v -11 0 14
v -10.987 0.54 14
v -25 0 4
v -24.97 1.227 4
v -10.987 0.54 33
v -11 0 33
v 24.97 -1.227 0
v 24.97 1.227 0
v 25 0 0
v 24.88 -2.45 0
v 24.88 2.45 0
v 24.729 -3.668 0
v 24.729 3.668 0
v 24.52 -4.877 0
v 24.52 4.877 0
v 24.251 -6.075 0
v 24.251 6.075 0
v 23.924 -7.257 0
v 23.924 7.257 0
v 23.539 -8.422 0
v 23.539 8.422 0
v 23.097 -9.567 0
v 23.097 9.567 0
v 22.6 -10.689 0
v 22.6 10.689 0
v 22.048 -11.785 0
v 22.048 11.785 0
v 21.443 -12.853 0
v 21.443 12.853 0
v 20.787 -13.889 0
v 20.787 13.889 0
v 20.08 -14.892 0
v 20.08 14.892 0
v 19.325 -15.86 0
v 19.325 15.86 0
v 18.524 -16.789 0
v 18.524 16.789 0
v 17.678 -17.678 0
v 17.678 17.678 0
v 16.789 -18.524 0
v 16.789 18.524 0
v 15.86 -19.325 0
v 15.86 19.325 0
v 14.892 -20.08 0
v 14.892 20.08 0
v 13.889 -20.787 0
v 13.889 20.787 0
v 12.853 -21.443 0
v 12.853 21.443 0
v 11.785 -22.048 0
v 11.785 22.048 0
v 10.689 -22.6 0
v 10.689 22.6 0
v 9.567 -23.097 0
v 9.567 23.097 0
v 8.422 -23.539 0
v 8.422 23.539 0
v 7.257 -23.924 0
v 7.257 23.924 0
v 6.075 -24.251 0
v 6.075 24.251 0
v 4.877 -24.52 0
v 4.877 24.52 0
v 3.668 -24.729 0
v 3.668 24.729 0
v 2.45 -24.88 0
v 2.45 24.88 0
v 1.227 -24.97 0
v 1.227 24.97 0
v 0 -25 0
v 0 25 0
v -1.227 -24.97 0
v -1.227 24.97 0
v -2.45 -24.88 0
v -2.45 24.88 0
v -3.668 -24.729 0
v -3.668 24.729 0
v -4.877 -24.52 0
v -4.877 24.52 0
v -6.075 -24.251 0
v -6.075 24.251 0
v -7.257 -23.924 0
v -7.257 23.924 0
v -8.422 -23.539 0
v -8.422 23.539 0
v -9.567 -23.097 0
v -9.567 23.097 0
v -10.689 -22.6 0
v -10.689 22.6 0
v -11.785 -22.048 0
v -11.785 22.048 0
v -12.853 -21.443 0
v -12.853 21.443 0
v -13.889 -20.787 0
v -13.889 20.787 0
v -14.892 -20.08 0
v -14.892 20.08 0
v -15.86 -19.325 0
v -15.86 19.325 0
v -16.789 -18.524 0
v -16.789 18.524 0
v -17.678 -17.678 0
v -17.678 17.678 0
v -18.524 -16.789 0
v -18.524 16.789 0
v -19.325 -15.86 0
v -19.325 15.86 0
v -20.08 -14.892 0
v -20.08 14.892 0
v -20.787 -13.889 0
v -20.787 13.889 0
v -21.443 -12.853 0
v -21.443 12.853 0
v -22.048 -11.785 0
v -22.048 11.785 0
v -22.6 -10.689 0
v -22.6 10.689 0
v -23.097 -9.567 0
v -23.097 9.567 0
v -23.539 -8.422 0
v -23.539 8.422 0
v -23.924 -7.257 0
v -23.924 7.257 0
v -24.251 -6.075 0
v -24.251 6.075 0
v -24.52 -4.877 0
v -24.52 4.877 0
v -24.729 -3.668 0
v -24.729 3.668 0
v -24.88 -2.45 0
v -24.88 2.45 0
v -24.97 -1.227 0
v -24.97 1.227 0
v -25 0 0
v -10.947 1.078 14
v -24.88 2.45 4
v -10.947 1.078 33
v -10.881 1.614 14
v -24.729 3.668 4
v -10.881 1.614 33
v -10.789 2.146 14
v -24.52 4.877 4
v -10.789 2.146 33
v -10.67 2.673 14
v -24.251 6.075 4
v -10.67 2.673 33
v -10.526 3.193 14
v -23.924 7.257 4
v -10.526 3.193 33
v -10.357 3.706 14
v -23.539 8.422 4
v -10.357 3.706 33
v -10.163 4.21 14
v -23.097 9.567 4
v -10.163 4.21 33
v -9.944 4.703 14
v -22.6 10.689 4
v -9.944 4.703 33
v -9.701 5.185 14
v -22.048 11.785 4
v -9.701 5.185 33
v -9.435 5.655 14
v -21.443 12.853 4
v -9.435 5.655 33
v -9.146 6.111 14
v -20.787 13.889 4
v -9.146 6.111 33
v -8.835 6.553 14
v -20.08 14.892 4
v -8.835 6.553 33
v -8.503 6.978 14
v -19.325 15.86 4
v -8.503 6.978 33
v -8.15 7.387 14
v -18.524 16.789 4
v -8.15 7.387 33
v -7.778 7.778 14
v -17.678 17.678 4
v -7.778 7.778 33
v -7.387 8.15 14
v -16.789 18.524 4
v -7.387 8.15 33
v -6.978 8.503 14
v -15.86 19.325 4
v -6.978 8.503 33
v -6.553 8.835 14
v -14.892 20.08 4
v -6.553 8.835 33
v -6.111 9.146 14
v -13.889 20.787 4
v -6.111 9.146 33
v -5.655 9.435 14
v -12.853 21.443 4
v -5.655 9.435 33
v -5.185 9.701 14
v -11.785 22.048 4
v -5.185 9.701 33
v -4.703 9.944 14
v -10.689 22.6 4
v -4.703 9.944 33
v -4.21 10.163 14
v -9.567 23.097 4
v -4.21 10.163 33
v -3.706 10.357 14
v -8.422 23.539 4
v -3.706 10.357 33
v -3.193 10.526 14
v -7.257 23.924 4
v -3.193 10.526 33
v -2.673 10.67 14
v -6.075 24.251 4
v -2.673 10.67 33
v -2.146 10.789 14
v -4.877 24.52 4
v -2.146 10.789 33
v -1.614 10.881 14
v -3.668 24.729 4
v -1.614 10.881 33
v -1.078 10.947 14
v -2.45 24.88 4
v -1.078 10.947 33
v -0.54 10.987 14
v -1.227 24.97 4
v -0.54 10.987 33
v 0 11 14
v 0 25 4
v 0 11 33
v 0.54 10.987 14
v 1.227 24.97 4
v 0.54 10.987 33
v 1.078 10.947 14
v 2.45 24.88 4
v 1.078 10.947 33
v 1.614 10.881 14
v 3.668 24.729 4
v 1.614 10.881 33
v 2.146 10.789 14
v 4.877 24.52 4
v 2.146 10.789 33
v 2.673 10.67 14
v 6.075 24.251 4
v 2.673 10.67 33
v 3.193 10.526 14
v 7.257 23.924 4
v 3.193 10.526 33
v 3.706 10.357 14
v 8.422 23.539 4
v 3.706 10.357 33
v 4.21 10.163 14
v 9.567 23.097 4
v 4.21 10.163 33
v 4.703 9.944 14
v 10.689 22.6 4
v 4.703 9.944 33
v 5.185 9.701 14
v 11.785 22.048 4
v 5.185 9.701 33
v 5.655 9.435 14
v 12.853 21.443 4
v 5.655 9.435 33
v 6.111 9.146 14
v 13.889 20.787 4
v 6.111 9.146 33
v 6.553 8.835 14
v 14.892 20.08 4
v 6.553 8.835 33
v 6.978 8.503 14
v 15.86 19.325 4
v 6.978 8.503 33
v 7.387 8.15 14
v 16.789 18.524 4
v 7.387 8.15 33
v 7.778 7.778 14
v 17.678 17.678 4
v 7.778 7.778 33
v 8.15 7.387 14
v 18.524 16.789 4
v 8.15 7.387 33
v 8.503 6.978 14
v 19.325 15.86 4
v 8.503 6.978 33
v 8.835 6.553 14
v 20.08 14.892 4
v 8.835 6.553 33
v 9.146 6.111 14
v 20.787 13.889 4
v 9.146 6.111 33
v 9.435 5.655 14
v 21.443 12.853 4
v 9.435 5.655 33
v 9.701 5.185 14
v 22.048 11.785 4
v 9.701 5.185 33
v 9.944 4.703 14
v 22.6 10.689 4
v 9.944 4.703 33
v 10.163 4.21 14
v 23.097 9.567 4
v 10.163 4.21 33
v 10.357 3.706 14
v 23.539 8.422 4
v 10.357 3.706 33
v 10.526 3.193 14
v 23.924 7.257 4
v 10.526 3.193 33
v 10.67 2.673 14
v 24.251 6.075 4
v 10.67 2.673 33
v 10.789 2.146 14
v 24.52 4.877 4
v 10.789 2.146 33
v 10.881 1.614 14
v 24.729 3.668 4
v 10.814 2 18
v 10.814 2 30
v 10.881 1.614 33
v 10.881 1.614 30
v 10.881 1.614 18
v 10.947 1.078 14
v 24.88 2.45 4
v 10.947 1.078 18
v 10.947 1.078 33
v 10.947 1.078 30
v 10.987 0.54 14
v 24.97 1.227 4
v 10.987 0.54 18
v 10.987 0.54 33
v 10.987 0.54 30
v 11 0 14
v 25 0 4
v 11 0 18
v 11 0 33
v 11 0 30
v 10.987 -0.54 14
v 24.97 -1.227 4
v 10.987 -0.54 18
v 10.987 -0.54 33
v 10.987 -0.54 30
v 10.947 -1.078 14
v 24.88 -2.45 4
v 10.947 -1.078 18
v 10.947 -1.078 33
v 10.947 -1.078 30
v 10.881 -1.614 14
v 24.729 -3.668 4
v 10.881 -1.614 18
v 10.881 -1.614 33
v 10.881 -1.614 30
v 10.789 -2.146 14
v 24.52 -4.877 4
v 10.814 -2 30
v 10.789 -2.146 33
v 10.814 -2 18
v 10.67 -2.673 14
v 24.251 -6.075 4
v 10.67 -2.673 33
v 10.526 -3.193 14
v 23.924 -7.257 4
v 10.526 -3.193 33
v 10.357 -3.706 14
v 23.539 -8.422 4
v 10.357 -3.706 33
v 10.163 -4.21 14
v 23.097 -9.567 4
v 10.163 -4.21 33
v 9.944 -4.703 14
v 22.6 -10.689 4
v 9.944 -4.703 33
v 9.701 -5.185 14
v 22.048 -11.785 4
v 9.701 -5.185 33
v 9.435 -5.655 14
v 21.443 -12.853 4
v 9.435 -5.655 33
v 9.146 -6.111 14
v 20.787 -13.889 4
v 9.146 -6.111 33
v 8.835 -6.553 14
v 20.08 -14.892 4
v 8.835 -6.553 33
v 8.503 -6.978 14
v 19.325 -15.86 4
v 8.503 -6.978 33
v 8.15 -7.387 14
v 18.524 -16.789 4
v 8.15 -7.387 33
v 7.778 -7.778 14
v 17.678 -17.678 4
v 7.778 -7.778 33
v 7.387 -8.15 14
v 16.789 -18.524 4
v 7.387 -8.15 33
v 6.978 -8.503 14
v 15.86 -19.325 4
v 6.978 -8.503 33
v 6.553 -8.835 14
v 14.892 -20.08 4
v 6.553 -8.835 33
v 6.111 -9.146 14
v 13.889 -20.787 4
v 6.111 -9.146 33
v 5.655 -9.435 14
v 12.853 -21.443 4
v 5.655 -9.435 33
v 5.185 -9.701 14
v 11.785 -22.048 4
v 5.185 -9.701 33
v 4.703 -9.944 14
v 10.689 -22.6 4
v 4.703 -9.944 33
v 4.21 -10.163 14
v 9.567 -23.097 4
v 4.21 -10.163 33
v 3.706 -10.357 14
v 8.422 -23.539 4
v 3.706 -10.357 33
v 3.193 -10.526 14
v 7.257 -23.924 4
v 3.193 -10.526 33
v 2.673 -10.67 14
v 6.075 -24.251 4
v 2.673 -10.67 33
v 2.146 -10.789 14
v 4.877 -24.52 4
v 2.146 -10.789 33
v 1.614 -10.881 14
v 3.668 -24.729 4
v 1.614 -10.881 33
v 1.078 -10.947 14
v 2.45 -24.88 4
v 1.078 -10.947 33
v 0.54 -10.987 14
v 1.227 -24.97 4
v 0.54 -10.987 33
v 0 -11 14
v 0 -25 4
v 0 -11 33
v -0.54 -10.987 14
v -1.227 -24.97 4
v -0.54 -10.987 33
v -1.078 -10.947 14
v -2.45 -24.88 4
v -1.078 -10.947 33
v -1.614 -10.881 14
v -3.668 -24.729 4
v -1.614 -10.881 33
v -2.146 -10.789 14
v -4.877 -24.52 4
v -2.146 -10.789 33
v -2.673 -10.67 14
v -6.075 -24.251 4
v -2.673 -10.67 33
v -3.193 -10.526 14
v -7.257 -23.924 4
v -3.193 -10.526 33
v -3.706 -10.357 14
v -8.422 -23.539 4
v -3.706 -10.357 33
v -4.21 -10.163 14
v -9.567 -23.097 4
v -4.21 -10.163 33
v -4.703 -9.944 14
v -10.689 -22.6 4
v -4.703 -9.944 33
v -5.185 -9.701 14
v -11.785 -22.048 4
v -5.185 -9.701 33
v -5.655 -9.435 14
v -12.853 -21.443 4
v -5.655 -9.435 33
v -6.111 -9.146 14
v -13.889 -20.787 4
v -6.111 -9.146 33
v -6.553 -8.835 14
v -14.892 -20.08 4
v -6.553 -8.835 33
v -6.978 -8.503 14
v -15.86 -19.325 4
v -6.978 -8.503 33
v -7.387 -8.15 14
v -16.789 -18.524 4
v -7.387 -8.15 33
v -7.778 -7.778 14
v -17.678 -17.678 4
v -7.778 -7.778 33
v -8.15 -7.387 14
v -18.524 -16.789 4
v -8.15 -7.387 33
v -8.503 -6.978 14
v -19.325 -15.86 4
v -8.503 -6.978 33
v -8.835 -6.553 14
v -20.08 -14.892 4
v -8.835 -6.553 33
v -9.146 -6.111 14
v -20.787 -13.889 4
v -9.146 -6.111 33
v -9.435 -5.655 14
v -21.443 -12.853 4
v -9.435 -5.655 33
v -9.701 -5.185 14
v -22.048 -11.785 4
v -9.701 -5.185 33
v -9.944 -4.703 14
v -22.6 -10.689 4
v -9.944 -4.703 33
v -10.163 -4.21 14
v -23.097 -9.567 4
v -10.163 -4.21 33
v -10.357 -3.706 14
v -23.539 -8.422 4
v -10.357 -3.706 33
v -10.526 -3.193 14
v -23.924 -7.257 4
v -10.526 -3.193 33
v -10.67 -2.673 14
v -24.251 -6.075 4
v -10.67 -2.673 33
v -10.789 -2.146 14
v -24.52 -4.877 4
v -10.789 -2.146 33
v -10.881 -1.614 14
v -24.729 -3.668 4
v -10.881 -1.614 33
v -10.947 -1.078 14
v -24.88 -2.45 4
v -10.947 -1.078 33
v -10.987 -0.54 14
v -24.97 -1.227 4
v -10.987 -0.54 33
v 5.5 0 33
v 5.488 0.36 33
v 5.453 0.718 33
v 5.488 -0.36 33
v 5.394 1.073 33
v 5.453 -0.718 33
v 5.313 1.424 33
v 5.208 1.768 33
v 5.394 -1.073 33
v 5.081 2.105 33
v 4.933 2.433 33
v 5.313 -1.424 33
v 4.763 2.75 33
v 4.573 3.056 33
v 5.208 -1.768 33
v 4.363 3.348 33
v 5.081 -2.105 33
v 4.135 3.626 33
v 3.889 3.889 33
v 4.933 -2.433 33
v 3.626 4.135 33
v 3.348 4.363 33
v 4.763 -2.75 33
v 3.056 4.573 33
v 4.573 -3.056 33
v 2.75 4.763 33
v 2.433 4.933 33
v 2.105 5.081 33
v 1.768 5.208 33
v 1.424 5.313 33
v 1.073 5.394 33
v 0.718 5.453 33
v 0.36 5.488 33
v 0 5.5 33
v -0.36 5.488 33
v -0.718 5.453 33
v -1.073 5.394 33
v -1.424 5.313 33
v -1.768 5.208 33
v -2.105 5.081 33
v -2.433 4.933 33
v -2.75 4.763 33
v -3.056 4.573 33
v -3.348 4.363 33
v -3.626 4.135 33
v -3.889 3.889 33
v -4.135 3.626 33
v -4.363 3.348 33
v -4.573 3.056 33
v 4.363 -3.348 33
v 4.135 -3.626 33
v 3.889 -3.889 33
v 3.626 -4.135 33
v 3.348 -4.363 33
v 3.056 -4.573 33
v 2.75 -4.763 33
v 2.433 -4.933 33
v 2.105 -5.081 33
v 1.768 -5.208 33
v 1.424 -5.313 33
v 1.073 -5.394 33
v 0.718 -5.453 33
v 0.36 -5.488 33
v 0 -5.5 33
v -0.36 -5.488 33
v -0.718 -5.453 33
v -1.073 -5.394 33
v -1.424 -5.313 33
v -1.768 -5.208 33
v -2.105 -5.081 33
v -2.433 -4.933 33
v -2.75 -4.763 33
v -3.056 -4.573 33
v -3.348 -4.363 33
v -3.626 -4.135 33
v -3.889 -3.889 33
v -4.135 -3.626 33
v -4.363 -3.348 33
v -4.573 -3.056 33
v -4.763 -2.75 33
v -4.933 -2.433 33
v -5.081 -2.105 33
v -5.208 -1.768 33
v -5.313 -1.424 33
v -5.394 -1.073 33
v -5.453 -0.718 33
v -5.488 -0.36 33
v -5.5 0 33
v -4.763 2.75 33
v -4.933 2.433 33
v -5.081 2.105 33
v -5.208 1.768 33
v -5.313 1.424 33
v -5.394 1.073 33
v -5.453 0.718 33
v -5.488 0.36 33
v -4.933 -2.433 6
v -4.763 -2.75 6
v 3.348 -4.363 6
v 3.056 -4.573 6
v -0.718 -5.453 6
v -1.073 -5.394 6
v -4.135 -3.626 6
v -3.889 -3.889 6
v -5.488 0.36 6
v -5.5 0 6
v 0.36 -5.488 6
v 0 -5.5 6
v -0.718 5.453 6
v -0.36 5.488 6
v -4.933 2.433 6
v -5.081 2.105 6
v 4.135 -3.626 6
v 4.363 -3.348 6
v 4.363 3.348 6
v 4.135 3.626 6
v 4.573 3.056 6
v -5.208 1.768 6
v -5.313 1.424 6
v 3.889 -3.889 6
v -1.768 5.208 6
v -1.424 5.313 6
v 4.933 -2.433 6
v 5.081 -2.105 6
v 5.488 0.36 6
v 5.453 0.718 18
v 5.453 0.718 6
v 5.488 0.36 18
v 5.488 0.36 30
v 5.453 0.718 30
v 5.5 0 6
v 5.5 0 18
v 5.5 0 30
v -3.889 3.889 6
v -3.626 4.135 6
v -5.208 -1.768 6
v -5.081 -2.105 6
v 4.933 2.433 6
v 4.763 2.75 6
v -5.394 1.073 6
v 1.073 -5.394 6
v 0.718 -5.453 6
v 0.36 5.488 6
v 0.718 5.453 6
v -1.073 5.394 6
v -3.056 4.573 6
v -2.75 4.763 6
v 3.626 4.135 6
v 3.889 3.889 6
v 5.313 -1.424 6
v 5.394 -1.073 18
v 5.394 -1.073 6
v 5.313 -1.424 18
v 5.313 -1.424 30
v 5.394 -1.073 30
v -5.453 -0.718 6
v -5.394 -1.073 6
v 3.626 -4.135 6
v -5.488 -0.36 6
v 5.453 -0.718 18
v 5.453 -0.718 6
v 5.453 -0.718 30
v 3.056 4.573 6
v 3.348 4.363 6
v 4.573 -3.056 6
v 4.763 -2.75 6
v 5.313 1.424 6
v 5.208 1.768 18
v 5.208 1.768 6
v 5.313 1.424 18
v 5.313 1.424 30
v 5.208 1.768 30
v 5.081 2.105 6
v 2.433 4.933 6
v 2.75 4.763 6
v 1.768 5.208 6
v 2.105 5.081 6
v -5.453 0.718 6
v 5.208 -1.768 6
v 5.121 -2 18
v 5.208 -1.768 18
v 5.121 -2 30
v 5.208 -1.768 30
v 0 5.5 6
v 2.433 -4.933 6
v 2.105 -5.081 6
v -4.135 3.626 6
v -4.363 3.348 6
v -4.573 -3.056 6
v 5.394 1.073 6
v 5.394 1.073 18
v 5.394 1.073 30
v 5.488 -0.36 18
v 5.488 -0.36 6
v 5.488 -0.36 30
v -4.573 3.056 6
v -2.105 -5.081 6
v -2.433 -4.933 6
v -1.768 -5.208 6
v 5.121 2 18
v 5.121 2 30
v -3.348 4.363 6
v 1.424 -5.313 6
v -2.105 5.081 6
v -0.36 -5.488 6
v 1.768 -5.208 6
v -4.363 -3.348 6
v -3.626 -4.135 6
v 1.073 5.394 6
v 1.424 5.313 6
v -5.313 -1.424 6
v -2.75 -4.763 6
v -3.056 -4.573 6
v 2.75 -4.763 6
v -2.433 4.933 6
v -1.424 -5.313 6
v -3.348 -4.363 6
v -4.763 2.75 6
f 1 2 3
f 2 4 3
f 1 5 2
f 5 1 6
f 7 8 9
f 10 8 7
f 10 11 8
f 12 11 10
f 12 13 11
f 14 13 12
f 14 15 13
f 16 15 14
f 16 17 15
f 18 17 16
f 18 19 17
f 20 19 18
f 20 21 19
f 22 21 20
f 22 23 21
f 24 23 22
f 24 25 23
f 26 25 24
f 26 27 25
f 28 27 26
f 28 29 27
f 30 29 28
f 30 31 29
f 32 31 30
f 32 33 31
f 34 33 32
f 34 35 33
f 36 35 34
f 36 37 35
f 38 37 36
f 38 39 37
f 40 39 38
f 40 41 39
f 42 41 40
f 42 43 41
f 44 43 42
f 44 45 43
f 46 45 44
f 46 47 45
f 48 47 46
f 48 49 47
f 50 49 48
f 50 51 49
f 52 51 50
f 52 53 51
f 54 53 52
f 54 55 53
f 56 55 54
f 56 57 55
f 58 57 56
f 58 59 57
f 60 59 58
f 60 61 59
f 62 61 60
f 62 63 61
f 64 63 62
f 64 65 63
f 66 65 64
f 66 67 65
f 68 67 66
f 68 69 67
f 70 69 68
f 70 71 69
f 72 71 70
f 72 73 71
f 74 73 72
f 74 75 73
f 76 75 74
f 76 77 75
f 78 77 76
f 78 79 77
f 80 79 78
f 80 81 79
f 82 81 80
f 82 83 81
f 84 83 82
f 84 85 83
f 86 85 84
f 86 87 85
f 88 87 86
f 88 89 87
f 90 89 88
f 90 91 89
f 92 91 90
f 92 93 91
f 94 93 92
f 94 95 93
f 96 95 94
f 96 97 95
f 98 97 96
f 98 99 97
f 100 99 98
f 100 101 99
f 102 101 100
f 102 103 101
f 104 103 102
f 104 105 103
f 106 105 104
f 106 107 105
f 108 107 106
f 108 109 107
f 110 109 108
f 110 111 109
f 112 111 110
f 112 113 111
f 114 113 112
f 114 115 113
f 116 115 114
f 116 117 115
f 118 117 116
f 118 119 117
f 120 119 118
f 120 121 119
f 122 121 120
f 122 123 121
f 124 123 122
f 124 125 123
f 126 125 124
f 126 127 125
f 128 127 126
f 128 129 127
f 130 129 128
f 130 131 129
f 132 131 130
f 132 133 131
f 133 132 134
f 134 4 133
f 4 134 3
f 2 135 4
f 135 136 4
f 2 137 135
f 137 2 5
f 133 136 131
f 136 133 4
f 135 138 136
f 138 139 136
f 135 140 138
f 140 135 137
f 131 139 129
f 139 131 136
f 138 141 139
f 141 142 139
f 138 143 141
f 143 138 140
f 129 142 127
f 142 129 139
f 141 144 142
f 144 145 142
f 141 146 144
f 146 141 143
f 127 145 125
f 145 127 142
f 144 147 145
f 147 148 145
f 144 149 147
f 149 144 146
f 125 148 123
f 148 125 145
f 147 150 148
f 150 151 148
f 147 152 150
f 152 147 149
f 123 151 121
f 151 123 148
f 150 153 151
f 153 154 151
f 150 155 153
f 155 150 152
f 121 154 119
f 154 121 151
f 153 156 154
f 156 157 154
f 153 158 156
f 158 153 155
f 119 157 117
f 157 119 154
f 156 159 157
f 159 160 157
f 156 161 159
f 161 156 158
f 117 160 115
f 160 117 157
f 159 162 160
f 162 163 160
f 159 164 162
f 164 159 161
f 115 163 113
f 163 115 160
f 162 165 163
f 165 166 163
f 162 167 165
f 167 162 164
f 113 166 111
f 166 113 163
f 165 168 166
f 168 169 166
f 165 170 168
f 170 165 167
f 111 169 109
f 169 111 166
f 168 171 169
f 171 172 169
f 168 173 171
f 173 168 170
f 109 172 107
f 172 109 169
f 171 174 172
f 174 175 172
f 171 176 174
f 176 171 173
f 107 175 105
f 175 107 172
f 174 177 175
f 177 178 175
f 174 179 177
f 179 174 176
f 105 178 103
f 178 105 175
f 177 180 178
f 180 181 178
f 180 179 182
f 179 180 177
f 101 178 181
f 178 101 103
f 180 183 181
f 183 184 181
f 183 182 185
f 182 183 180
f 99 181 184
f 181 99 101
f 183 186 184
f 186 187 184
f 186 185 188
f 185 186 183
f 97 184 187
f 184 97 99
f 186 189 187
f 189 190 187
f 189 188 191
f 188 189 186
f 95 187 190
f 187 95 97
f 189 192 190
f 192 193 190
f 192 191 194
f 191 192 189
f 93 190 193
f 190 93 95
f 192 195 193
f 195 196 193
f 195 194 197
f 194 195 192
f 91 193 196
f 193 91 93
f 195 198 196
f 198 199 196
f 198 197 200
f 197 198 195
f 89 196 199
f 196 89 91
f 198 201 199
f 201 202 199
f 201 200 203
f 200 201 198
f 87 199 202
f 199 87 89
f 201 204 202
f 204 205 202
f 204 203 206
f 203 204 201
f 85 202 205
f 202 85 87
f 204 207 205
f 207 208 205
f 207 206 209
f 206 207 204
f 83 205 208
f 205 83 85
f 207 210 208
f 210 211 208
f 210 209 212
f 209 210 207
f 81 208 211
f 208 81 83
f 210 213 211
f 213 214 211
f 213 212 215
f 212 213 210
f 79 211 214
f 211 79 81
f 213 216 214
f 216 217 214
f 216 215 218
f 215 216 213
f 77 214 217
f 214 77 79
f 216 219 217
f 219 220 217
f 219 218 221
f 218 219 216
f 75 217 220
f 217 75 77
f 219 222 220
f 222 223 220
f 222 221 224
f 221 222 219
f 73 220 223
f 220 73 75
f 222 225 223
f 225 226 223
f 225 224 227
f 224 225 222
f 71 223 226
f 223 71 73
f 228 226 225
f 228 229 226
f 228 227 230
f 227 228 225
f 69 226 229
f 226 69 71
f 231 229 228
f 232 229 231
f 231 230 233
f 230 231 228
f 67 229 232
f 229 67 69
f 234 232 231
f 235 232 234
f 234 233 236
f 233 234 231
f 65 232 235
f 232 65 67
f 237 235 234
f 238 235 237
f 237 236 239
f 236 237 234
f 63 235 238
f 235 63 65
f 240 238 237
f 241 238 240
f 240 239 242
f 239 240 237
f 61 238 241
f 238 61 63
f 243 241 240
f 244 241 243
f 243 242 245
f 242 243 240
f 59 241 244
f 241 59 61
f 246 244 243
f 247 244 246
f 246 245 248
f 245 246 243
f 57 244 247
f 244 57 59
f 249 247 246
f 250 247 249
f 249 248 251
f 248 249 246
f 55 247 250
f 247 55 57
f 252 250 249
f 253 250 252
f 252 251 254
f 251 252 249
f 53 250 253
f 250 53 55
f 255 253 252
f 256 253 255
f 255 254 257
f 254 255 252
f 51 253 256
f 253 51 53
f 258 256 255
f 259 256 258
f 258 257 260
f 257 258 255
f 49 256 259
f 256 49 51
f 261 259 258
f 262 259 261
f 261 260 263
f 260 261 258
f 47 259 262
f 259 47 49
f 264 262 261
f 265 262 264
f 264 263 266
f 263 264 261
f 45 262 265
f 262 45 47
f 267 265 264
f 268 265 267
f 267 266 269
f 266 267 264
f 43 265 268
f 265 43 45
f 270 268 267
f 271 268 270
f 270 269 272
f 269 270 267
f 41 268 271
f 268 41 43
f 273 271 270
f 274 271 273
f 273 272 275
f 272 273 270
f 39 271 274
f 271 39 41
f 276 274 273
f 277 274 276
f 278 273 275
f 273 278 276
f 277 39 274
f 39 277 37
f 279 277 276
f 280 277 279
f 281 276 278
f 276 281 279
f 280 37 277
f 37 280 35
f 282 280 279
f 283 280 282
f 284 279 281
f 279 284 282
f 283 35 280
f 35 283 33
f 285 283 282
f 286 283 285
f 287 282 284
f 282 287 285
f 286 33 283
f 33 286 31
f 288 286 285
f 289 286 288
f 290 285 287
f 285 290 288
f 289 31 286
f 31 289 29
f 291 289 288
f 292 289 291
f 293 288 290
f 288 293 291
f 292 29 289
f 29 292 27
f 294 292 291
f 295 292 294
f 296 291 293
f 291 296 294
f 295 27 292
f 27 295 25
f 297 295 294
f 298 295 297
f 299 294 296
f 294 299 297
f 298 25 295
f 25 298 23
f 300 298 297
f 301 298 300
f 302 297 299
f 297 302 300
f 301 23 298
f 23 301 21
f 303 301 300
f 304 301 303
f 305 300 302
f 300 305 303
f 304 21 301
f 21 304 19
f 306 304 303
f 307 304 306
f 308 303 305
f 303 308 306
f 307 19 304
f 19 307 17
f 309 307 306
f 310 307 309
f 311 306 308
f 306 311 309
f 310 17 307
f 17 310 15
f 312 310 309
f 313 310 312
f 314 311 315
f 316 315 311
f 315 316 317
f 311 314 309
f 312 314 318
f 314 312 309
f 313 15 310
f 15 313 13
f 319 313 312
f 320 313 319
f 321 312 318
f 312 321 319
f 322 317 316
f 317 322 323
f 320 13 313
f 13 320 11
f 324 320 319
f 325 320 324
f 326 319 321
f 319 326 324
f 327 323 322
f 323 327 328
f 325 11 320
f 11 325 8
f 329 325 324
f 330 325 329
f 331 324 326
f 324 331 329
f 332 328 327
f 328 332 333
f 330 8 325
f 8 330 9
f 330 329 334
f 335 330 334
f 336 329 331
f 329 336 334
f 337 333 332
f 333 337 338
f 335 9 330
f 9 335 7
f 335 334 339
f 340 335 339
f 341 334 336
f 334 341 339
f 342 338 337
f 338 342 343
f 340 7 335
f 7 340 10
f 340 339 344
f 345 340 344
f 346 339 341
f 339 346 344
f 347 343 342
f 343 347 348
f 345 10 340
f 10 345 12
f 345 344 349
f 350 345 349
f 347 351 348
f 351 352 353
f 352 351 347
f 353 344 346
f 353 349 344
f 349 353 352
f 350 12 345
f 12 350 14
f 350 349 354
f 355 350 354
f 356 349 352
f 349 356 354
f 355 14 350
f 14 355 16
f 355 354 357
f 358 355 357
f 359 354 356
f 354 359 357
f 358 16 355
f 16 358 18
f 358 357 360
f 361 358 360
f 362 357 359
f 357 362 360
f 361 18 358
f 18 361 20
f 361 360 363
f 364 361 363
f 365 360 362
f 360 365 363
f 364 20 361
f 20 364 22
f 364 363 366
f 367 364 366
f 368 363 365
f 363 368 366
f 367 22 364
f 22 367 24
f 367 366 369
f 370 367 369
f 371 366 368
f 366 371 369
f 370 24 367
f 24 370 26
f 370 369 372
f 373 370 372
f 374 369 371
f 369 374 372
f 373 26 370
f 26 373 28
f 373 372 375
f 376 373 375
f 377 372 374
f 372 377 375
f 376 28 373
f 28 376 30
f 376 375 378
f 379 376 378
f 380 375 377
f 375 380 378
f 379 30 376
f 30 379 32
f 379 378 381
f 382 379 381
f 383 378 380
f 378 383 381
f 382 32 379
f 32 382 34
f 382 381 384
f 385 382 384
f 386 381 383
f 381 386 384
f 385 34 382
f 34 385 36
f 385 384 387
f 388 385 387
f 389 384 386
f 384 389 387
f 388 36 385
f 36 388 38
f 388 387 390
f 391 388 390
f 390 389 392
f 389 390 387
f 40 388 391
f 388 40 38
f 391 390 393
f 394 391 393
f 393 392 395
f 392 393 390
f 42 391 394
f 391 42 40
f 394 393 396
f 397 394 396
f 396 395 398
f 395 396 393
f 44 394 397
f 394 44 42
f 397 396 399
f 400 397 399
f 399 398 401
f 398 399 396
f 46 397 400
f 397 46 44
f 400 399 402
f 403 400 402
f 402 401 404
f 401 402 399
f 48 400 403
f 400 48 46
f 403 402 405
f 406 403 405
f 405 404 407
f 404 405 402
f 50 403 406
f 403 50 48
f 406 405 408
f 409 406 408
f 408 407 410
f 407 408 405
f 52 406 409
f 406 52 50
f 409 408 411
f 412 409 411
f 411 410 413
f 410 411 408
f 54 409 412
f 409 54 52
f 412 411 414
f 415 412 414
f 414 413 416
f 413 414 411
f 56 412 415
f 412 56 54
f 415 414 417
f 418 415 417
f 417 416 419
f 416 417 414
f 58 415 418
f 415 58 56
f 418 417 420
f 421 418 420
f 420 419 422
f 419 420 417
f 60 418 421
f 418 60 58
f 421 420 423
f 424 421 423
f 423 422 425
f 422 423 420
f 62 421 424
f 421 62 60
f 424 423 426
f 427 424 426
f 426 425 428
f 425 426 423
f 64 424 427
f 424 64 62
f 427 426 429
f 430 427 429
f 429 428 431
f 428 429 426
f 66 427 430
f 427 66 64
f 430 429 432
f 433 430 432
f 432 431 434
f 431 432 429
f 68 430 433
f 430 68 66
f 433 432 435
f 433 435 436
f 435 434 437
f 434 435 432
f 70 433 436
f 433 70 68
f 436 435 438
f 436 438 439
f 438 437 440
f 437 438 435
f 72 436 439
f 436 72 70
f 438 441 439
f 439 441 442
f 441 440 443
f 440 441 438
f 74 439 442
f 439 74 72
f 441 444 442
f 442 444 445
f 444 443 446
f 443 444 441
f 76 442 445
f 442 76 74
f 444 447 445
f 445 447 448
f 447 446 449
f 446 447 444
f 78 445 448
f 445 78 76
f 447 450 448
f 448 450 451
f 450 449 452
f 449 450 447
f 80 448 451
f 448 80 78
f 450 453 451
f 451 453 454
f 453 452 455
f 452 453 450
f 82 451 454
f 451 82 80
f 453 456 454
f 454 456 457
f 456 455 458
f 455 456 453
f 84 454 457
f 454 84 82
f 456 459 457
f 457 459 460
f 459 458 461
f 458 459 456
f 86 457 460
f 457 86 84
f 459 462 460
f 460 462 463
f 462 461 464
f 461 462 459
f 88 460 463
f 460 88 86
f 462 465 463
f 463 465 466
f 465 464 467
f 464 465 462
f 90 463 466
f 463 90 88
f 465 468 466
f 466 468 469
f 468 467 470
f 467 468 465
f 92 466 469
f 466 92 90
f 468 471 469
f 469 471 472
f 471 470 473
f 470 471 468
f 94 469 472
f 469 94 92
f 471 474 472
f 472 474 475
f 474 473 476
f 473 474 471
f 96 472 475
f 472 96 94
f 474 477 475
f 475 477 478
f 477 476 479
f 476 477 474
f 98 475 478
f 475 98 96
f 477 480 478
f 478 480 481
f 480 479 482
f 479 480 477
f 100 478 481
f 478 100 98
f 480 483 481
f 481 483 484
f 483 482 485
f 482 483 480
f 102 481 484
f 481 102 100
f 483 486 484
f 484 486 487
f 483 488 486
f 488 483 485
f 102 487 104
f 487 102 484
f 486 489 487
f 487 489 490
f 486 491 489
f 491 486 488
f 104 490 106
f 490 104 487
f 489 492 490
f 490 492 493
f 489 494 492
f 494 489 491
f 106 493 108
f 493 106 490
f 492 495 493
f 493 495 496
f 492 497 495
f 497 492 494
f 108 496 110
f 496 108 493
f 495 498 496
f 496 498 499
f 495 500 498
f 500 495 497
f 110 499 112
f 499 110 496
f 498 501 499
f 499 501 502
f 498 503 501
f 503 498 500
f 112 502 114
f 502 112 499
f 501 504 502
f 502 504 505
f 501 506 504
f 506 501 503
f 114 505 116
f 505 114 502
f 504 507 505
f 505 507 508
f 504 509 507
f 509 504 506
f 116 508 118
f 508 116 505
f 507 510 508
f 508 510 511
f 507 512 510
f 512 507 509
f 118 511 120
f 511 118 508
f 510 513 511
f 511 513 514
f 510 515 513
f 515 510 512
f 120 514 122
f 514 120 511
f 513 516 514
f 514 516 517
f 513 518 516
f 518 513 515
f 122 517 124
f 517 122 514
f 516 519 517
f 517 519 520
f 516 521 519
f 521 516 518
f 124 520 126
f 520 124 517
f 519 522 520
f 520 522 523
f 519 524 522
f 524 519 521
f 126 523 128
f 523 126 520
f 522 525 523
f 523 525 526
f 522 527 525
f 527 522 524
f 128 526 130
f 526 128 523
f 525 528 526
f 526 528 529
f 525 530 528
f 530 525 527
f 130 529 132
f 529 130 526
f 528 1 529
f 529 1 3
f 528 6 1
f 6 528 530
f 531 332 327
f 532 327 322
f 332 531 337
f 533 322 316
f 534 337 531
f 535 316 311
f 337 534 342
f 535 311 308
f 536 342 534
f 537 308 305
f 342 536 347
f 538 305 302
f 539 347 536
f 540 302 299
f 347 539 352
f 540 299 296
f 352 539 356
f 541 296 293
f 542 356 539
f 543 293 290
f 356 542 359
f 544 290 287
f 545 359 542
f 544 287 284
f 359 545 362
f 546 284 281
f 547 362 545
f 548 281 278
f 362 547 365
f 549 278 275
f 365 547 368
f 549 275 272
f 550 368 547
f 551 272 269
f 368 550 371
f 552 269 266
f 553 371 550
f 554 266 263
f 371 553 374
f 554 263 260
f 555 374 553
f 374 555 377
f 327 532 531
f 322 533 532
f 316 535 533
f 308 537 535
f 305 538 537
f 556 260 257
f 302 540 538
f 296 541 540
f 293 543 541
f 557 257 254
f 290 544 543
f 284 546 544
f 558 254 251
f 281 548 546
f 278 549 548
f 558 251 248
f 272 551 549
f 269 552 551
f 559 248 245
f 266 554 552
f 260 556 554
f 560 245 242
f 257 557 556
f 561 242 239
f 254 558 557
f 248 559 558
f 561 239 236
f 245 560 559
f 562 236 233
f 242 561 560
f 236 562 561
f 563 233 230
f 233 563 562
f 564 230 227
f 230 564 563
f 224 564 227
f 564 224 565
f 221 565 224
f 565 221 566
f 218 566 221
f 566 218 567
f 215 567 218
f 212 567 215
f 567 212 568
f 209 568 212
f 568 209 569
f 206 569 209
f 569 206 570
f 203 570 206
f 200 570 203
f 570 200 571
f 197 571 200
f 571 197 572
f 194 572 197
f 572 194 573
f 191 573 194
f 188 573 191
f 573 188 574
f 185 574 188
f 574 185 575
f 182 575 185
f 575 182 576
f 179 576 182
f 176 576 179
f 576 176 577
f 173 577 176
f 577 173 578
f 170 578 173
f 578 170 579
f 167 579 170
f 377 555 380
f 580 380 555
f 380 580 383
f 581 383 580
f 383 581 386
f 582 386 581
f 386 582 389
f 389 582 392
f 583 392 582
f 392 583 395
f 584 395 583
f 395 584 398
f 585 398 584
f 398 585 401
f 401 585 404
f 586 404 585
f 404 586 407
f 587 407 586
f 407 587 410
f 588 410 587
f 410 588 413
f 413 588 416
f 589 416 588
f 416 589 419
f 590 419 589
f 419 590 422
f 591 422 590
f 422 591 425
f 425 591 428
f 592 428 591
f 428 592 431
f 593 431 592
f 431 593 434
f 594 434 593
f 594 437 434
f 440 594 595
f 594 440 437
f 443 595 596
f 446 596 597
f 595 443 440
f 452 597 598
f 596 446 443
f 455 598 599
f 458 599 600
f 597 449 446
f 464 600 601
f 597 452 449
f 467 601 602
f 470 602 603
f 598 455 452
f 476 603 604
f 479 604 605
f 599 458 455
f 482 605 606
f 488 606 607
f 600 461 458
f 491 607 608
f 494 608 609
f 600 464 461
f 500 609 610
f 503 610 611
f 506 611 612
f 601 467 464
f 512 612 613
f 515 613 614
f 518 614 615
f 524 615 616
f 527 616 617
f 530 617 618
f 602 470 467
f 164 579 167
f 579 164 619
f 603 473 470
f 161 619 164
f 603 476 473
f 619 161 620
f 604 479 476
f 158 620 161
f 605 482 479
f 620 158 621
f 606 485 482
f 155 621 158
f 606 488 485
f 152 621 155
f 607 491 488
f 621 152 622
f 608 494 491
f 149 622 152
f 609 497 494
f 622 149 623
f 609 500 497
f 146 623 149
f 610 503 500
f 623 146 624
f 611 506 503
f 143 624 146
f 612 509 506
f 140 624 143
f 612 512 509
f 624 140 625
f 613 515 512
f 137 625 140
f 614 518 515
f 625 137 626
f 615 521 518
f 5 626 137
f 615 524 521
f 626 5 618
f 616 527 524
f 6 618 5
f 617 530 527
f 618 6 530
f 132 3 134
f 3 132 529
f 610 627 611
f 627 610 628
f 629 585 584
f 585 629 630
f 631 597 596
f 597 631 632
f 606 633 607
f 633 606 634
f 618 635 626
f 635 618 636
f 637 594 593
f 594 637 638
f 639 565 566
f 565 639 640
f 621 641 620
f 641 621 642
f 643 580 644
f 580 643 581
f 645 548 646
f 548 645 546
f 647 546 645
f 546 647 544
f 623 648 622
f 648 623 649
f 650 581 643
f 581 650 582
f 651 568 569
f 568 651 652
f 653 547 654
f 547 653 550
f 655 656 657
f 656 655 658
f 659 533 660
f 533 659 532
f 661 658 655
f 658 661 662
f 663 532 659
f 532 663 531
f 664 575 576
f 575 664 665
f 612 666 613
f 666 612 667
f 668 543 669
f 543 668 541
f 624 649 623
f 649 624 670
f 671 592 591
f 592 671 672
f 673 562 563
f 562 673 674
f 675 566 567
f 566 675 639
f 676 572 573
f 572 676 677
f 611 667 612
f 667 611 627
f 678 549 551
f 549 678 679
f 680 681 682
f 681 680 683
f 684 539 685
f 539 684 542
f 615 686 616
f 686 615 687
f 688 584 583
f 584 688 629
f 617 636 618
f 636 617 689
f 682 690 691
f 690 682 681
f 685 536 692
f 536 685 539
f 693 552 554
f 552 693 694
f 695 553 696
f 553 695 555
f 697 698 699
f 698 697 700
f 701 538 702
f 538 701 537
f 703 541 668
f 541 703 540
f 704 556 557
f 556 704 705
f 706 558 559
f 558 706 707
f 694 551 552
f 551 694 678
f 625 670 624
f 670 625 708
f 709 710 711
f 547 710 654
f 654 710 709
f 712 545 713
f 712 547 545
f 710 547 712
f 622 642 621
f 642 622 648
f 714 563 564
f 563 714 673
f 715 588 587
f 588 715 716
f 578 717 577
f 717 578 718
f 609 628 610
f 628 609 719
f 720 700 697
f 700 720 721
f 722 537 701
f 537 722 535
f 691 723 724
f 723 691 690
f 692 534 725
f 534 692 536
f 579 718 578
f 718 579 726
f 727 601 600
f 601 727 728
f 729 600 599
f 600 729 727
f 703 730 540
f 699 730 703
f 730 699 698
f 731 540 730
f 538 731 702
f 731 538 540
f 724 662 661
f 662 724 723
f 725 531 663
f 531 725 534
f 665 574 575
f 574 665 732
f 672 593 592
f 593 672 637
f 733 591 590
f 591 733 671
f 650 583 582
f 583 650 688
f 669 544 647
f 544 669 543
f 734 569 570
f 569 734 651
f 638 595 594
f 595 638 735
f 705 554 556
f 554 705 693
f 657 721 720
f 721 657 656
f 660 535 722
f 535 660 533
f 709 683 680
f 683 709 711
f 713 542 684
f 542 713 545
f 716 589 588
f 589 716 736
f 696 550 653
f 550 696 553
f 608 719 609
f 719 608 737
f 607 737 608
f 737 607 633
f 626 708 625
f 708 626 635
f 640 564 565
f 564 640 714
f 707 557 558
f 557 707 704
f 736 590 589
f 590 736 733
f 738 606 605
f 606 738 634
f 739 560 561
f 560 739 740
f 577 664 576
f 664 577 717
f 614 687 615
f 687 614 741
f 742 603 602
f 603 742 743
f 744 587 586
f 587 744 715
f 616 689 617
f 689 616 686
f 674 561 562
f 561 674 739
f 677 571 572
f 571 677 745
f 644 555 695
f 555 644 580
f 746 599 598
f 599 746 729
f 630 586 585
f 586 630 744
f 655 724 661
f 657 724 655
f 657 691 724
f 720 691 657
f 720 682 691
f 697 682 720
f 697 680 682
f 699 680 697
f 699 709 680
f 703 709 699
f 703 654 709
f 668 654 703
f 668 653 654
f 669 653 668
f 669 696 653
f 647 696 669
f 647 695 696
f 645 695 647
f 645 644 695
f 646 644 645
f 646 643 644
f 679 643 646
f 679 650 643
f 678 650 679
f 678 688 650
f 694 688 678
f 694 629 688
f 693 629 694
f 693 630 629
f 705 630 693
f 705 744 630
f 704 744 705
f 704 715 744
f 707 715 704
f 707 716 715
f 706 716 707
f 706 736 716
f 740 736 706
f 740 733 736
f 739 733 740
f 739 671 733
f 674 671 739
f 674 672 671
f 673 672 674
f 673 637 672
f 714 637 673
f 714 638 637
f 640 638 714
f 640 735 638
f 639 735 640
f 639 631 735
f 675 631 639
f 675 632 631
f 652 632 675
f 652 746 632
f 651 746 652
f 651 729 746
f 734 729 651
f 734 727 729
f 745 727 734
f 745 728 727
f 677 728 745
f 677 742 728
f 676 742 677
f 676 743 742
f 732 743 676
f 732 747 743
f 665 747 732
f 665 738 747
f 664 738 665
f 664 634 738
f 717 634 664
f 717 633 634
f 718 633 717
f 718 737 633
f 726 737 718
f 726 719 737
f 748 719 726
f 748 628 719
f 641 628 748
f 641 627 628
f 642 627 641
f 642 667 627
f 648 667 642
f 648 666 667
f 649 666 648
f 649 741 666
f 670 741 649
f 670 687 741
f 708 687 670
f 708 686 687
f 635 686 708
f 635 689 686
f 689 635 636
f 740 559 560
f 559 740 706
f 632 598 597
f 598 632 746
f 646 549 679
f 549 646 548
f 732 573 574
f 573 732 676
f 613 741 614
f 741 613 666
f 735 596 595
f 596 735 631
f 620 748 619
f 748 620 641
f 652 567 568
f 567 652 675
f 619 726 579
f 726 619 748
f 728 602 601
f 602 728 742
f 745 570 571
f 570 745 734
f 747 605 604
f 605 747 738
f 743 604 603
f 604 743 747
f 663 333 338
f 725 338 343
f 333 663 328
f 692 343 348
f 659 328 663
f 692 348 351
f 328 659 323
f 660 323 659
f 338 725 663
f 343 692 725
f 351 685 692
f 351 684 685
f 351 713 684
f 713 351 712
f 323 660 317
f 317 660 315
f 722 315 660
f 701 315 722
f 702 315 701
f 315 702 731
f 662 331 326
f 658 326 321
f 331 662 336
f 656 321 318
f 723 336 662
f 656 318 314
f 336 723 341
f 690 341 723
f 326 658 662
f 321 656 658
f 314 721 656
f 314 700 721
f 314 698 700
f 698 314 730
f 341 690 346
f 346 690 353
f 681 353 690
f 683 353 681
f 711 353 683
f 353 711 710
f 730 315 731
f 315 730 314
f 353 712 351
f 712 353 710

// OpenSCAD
// KNOWN-WRONG PART (must fail): the seat is an 11 mm cylinder down to z = 6 (no cone)
// Weighing stand that holds one 1.5 mL microcentrifuge tube upright on a balance pan
// Category: quick fixes. A revolved stand (base disc, cone, column) with a seat that follows the
// tube's conical tip, and a viewing window through the column wall on the +X side.
// Print: PLA or PETG, standing up, 0.2 mm layers. Tare the balance with the stand on it.
// SPDX-License-Identifier: CERN-OHL-P-2.0

/* [Stand] */
base_d = 50;  base_h = 4;       // disc z = 0 .. 4
col_d = 22;   cone_top = 14;    // cone 50 -> 22 mm from z = 4 to 14
height = 33;                    // column from z = 14 to 33
seat_d = 11;  seat_cyl_z = 23;  // 11 mm from the top down to z = 23 ...
tip_d = 11;   tip_z = 6;        // ... then a cone narrowing to 3 mm at z = 6
win_w = 4;    win_z = [18, 30]; // viewing window through the +X wall

/* [Hidden] */
$fn = 128;
eps = 0.01;

difference() {
    rotate_extrude() polygon([[0, 0], [base_d / 2, 0], [base_d / 2, base_h], [col_d / 2, cone_top],
                              [col_d / 2, height], [0, height]]);
    translate([0, 0, tip_z]) cylinder(d1 = tip_d, d2 = seat_d, h = seat_cyl_z - tip_z + eps, $fn = 96);
    translate([0, 0, seat_cyl_z]) cylinder(d = seat_d, h = height - seat_cyl_z + 1, $fn = 96);
    translate([0, -win_w / 2, win_z[0]]) cube([col_d / 2 + 1, win_w, win_z[1] - win_z[0]]);
}
